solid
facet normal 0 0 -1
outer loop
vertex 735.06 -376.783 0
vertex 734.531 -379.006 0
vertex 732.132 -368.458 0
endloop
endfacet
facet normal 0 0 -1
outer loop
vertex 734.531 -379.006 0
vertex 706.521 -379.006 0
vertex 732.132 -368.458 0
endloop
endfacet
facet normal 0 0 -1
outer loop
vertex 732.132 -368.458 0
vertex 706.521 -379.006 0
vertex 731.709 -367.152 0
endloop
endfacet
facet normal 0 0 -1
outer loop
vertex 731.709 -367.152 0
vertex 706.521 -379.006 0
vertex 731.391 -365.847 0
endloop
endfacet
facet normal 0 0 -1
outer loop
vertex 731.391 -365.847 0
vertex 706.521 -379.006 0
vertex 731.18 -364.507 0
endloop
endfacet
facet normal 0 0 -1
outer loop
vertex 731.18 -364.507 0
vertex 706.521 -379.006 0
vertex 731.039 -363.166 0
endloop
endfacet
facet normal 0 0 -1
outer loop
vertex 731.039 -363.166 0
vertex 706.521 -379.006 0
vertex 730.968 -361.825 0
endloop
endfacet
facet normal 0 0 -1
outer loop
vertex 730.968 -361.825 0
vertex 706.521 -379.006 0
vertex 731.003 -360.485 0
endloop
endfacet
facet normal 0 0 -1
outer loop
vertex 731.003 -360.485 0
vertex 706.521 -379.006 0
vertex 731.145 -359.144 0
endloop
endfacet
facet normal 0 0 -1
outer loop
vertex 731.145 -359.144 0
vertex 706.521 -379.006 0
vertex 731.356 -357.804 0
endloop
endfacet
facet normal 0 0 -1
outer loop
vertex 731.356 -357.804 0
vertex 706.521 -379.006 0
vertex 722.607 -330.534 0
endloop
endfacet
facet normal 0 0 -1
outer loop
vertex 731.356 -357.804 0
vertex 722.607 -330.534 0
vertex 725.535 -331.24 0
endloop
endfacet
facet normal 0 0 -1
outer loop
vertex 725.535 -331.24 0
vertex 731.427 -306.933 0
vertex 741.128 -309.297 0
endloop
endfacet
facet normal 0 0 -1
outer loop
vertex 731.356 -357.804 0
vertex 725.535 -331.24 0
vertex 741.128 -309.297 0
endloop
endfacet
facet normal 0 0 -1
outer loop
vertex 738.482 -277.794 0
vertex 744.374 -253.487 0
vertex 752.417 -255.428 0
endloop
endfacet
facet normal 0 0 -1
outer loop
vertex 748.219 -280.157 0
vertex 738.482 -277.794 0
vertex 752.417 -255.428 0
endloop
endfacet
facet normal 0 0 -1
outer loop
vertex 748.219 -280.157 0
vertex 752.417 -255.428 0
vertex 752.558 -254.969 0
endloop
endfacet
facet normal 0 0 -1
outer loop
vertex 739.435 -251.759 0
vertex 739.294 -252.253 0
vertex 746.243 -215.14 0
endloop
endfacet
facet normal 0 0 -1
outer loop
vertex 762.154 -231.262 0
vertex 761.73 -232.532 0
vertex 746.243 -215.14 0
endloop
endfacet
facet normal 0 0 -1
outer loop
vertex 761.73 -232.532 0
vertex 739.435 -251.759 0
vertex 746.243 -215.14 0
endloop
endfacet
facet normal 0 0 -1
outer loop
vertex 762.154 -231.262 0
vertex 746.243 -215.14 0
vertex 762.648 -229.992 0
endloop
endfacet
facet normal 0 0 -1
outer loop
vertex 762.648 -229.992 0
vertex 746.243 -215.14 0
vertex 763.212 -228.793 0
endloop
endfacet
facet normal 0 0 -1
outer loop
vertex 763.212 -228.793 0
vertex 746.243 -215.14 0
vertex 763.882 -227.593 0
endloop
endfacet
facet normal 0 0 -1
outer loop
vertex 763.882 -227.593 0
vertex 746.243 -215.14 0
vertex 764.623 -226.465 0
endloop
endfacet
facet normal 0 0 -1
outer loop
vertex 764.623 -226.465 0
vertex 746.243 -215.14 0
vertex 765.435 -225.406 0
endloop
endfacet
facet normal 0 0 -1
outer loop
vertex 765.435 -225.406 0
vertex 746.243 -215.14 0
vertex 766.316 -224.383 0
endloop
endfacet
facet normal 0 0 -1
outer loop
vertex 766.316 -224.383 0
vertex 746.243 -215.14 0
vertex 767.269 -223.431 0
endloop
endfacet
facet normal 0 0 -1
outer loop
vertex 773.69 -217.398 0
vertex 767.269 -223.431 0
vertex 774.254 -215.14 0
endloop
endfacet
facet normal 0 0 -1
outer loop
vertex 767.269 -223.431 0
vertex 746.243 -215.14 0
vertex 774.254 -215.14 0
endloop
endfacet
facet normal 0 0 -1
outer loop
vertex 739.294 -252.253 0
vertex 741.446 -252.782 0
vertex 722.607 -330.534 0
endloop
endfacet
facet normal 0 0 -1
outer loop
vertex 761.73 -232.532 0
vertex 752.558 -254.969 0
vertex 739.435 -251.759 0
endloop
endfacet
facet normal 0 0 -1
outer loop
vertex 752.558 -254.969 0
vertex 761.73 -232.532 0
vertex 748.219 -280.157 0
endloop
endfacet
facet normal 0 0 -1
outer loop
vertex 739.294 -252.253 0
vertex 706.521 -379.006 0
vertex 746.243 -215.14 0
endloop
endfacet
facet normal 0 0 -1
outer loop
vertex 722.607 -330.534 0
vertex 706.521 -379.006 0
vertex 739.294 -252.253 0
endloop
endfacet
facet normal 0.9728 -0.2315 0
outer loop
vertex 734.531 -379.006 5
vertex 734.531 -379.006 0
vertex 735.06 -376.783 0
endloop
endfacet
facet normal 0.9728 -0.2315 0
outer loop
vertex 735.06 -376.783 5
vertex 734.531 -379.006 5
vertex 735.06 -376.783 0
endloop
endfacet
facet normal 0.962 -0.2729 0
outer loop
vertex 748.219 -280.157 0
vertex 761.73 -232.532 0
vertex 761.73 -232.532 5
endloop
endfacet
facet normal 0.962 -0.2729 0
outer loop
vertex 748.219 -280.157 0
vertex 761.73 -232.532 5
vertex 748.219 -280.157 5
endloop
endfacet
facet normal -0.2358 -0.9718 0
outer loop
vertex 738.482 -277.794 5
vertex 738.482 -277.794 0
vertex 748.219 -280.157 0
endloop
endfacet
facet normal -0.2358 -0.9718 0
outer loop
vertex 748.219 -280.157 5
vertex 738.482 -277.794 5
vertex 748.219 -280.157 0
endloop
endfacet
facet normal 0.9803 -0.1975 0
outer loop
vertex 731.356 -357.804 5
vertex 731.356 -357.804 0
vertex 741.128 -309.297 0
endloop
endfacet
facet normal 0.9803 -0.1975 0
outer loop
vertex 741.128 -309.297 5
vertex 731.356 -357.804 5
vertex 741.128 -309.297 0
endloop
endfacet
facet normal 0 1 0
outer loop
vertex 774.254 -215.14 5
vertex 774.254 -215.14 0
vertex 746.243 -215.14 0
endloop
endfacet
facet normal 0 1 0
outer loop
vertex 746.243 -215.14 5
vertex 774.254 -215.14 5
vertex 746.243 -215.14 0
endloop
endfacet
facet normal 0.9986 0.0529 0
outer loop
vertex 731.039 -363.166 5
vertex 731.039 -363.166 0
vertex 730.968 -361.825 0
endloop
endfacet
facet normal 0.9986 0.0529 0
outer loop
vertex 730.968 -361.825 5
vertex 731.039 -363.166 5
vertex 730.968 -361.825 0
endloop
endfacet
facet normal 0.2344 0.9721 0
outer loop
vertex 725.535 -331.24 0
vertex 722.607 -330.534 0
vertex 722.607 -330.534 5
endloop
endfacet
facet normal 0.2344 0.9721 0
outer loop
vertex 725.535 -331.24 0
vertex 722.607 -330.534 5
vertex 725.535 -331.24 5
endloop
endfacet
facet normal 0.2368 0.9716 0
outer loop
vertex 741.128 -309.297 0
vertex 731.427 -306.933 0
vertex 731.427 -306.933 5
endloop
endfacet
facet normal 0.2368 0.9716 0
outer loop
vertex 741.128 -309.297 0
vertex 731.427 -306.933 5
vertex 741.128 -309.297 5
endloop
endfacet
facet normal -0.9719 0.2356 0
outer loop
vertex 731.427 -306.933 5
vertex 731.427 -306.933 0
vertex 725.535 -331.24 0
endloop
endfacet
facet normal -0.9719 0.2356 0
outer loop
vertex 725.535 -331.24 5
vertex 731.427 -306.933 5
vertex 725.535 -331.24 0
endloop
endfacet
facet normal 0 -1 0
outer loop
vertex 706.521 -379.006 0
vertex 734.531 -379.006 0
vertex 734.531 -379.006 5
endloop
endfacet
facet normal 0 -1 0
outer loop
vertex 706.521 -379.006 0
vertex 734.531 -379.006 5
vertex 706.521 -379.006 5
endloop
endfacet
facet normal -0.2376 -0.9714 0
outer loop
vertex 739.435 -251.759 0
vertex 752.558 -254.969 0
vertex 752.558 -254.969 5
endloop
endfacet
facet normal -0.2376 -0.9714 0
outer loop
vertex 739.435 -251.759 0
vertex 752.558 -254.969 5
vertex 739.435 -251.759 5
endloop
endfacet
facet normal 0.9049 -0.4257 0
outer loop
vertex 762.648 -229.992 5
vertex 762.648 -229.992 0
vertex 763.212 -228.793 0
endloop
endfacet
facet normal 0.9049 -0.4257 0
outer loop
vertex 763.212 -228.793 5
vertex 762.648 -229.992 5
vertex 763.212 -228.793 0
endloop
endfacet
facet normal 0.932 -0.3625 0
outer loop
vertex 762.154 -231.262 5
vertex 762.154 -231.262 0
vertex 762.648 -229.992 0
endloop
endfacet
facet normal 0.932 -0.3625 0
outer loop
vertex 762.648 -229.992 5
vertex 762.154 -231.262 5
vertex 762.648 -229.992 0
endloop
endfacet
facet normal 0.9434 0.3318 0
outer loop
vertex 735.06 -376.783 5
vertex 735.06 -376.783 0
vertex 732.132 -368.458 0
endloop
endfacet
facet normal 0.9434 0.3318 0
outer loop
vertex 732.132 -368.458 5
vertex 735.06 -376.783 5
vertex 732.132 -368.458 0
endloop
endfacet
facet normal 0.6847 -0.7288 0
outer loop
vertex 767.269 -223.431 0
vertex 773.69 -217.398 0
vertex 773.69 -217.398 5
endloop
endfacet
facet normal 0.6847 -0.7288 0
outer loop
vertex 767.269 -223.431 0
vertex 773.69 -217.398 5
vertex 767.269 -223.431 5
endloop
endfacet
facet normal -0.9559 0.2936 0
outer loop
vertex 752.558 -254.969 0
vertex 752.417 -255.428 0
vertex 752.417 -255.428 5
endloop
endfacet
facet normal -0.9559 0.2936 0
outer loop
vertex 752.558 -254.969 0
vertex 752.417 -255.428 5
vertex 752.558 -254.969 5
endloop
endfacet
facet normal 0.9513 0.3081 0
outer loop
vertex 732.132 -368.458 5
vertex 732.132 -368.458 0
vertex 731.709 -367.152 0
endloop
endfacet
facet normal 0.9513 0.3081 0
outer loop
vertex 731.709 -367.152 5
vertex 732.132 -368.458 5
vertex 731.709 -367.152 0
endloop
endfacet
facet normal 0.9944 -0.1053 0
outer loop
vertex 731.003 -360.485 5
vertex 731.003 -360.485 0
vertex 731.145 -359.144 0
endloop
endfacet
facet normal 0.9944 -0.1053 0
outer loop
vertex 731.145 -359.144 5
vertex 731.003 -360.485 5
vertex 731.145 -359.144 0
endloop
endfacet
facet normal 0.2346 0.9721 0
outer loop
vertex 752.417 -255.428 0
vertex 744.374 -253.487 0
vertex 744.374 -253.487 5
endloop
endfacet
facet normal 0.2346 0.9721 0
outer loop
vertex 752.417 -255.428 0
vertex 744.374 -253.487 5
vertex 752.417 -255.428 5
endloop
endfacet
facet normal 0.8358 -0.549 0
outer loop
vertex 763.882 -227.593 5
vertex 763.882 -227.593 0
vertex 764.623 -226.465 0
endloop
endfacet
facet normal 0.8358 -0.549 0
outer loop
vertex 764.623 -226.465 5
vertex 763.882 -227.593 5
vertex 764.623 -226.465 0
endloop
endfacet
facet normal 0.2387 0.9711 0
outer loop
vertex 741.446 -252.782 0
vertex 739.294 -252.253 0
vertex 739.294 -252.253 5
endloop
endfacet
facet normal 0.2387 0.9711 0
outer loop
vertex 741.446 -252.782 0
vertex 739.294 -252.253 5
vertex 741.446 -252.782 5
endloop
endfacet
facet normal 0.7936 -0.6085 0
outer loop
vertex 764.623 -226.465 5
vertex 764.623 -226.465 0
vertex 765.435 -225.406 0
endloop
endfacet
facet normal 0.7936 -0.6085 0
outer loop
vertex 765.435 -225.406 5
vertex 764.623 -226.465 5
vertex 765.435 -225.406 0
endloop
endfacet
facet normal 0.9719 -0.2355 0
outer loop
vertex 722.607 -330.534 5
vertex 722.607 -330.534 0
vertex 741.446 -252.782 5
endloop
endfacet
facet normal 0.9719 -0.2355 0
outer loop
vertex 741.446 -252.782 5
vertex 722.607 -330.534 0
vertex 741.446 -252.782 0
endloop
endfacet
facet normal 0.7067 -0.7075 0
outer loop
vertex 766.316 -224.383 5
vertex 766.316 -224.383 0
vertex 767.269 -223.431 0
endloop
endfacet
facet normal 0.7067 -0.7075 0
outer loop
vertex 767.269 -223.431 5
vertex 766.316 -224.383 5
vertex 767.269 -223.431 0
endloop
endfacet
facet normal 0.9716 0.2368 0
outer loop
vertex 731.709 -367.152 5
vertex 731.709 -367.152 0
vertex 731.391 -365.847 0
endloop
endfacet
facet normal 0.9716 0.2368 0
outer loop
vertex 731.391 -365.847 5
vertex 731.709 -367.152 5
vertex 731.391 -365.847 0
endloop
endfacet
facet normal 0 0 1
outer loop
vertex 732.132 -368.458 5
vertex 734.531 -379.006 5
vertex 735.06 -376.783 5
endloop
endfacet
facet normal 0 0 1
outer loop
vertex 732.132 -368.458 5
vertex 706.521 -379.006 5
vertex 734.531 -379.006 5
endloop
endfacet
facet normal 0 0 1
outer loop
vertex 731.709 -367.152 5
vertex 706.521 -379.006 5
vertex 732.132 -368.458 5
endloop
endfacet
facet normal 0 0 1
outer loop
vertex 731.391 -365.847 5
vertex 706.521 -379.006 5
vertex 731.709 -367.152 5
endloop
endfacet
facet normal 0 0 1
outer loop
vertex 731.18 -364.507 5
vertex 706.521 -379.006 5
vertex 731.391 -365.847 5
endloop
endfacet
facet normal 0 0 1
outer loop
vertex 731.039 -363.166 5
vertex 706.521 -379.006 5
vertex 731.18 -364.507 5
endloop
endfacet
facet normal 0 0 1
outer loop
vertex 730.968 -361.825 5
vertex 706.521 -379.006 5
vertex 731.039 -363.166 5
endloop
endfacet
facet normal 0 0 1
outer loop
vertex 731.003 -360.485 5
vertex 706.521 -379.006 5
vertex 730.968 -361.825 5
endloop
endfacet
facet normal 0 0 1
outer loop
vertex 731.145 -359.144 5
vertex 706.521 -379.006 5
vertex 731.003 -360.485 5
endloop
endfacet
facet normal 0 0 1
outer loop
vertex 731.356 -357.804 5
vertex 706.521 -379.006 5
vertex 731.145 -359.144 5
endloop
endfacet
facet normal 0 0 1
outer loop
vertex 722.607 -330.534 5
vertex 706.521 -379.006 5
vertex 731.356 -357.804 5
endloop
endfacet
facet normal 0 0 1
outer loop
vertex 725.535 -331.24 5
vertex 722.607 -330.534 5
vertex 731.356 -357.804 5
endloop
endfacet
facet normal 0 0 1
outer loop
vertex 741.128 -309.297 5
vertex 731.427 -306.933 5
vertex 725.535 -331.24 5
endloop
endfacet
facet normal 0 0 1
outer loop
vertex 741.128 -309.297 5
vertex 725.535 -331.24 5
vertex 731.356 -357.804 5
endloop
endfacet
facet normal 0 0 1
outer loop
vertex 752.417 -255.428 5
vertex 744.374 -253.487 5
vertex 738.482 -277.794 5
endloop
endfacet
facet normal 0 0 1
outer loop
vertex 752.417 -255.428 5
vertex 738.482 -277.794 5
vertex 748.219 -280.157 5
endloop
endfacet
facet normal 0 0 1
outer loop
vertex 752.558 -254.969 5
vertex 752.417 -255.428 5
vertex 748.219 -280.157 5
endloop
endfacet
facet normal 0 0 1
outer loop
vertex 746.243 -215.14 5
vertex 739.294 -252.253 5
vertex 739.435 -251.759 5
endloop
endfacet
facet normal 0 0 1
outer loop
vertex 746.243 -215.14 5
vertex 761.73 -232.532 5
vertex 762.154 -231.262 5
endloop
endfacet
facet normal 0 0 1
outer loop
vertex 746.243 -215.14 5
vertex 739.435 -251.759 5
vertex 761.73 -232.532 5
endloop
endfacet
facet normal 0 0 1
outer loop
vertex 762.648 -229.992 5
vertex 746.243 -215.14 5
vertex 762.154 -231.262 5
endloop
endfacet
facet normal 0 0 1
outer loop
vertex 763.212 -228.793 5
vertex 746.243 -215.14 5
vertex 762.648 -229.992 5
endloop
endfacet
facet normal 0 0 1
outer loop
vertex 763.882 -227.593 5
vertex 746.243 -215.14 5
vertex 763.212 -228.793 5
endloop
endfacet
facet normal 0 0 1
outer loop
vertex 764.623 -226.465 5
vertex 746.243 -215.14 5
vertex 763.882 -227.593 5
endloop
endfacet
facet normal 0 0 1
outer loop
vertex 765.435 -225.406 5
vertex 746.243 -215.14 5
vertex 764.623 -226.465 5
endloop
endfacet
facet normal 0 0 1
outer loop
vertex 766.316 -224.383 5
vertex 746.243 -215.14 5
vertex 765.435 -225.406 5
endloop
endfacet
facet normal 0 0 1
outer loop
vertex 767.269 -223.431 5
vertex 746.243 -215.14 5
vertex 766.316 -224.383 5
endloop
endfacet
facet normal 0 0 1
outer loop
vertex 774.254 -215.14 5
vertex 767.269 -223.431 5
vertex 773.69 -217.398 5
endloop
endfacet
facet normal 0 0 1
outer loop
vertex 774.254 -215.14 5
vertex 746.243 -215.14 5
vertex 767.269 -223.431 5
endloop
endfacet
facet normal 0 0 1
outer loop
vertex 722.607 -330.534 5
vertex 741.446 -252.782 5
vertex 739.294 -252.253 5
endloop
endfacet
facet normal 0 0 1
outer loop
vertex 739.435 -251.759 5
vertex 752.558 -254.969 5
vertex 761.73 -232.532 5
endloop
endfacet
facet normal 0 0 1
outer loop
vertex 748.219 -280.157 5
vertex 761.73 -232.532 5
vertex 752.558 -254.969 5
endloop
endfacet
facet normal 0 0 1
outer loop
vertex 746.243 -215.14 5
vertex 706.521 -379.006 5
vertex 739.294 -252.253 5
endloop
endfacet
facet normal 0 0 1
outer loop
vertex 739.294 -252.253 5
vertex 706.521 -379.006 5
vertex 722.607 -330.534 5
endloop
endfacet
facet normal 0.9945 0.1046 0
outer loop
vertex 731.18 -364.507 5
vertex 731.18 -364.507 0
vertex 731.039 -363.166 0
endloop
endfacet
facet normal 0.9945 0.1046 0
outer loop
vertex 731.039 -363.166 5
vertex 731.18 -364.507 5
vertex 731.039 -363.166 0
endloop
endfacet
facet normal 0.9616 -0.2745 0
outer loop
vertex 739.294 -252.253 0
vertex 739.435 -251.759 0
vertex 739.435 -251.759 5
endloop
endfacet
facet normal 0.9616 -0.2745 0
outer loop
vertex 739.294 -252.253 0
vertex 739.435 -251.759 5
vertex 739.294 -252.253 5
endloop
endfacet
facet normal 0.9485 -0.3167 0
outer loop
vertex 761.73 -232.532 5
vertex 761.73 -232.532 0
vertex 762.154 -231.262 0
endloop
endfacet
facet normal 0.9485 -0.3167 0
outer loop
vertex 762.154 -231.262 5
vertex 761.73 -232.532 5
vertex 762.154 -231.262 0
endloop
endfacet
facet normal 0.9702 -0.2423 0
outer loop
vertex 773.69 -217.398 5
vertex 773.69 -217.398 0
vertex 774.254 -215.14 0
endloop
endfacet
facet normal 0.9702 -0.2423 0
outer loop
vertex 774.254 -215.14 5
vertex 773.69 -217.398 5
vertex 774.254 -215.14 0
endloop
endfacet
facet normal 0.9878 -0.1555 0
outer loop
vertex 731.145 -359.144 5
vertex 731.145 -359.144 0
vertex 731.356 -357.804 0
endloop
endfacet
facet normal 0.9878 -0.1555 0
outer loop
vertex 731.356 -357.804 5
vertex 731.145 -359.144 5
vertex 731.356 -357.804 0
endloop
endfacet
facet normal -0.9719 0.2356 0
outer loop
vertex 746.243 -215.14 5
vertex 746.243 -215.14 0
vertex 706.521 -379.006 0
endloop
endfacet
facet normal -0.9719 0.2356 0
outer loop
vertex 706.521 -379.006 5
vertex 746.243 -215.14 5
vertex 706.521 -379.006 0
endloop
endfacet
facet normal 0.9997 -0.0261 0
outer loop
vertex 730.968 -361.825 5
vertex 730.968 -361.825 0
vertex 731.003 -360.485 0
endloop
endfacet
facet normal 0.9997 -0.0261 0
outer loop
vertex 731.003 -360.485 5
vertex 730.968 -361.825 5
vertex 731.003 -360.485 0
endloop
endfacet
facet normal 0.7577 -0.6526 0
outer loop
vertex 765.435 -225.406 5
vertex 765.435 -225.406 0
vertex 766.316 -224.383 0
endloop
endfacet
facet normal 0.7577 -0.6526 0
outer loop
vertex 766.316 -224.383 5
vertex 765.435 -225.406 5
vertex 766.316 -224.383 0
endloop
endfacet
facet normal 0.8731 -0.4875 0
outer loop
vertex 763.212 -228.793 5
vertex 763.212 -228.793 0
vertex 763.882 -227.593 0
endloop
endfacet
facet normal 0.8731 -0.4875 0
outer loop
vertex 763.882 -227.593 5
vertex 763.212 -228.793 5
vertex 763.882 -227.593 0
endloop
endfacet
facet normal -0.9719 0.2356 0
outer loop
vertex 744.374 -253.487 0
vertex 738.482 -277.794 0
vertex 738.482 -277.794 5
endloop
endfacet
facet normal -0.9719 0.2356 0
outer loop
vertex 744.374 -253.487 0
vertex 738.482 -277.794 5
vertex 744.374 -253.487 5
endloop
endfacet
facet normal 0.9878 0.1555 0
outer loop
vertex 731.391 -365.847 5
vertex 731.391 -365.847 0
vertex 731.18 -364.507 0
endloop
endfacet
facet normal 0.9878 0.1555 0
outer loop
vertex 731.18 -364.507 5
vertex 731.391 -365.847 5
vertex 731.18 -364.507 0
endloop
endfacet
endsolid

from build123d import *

# Parameters (mm, degrees)
PAD007_DEPTH = 5


with BuildPart() as part:
    # Sketch007 → Pad007 (new body)
    with BuildSketch(Plane.XY):
        with BuildLine():
            add(Edge.make_bspline(
                [(734.531204, -379.005712), (735.06037, -376.783212)],
                knots=[0, 0, 6.47611, 6.47611], degree=1))
            add(Edge.make_bspline(
                [(735.06037, -376.783212), (732.132315, -368.457656)],
                knots=[0, 0, 25.016994, 25.016994], degree=1))
            add(Edge.make_bspline(
                [(732.132315, -368.457656), (731.708982, -367.152379)],
                knots=[0, 0, 3.88973, 3.88973], degree=1))
            add(Edge.make_bspline(
                [(731.708982, -367.152379), (731.391482, -365.847101)],
                knots=[0, 0, 3.807887, 3.807887], degree=1))
            add(Edge.make_bspline(
                [(731.391482, -365.847101), (731.179815, -364.506545)],
                knots=[0, 0, 3.847077, 3.847077], degree=1))
            add(Edge.make_bspline(
                [(731.179815, -364.506545), (731.038704, -363.16599)],
                knots=[0, 0, 3.820995, 3.820995], degree=1))
            add(Edge.make_bspline(
                [(731.038704, -363.16599), (730.968148, -361.825434)],
                knots=[0, 0, 3.80526, 3.80526], degree=1))
            add(Edge.make_bspline(
                [(730.968148, -361.825434), (731.003426, -360.484879)],
                knots=[0, 0, 3.801316, 3.801316], degree=1))
            add(Edge.make_bspline(
                [(731.003426, -360.484879), (731.144537, -359.144323)],
                knots=[0, 0, 3.820995, 3.820995], degree=1))
            add(Edge.make_bspline(
                [(731.144537, -359.144323), (731.356204, -357.803768)],
                knots=[0, 0, 3.847077, 3.847077], degree=1))
            add(Edge.make_bspline(
                [(731.356204, -357.803768), (741.128148, -309.296824)],
                knots=[0, 0, 140.262397, 140.262397], degree=1))
            add(Edge.make_bspline(
                [(731.426759, -306.933213), (741.128148, -309.296824)],
                knots=[0, 0, 28.304417, 28.304417], degree=1))
            add(Edge.make_bspline(
                [(731.426759, -306.933213), (725.535371, -331.239602)],
                knots=[0, 0, 70.894993, 70.894993], degree=1))
            add(Edge.make_bspline(
                [(722.607315, -330.534046), (725.535371, -331.239602)],
                knots=[0, 0, 8.537564, 8.537564], degree=1))
            add(Edge.make_bspline(
                [(722.607315, -330.534046), (741.445648, -252.781826)],
                knots=[0, 0, 226.776807, 226.776807], degree=1))
            add(Edge.make_bspline(
                [(739.293704, -252.252659), (741.445648, -252.781826)],
                knots=[0, 0, 6.28172, 6.28172], degree=1))
            add(Edge.make_bspline(
                [(739.434815, -251.75877), (739.293704, -252.252659)],
                knots=[0, 0, 1.456022, 1.456022], degree=1))
            add(Edge.make_bspline(
                [(752.558148, -254.969048), (739.434815, -251.75877)],
                knots=[0, 0, 38.296867, 38.296867], degree=1))
            add(Edge.make_bspline(
                [(752.417037, -255.427659), (752.558148, -254.969048)],
                knots=[0, 0, 1.360147, 1.360147], degree=1))
            add(Edge.make_bspline(
                [(744.373704, -253.487381), (752.417037, -255.427659)],
                knots=[0, 0, 23.453998, 23.453998], degree=1))
            add(Edge.make_bspline(
                [(738.482315, -277.793769), (744.373704, -253.487381)],
                knots=[0, 0, 70.894993, 70.894993], degree=1))
            add(Edge.make_bspline(
                [(738.482315, -277.793769), (748.218981, -280.157381)],
                knots=[0, 0, 28.401584, 28.401584], degree=1))
            add(Edge.make_bspline(
                [(761.73037, -232.532382), (748.218981, -280.157381)],
                knots=[0, 0, 140.327795, 140.327795], degree=1))
            add(Edge.make_bspline(
                [(761.73037, -232.532382), (762.153703, -231.262382)],
                knots=[0, 0, 3.794733, 3.794733], degree=1))
            add(Edge.make_bspline(
                [(762.153703, -231.262382), (762.647592, -229.992382)],
                knots=[0, 0, 3.862642, 3.862642], degree=1))
            add(Edge.make_bspline(
                [(762.647592, -229.992382), (763.212037, -228.792937)],
                knots=[0, 0, 3.757659, 3.757659], degree=1))
            add(Edge.make_bspline(
                [(763.212037, -228.792937), (763.882314, -227.593493)],
                knots=[0, 0, 3.894868, 3.894868], degree=1))
            add(Edge.make_bspline(
                [(763.882314, -227.593493), (764.623148, -226.464604)],
                knots=[0, 0, 3.827532, 3.827532], degree=1))
            add(Edge.make_bspline(
                [(764.623148, -226.464604), (765.434536, -225.406271)],
                knots=[0, 0, 3.780212, 3.780212], degree=1))
            add(Edge.make_bspline(
                [(765.434536, -225.406271), (766.316481, -224.383215)],
                knots=[0, 0, 3.828838, 3.828838], degree=1))
            add(Edge.make_bspline(
                [(766.316481, -224.383215), (767.268981, -223.430715)],
                knots=[0, 0, 3.818377, 3.818377], degree=1))
            add(Edge.make_bspline(
                [(773.689536, -217.398215), (767.268981, -223.430715)],
                knots=[0, 0, 24.972985, 24.972985], degree=1))
            add(Edge.make_bspline(
                [(773.689536, -217.398215), (774.253981, -215.140438)],
                knots=[0, 0, 6.596969, 6.596969], degree=1))
            add(Edge.make_bspline(
                [(774.253981, -215.140438), (746.243426, -215.140438)],
                knots=[0, 0, 79.4, 79.4], degree=1))
            Line((746.243426, -215.140438), (706.520649, -379.005712))
            add(Edge.make_bspline(
                [(734.531204, -379.005712), (706.520649, -379.005712)],
                knots=[0, 0, 79.4, 79.4], degree=1))
        make_face()
    extrude(amount=PAD007_DEPTH)


solid = part.part
